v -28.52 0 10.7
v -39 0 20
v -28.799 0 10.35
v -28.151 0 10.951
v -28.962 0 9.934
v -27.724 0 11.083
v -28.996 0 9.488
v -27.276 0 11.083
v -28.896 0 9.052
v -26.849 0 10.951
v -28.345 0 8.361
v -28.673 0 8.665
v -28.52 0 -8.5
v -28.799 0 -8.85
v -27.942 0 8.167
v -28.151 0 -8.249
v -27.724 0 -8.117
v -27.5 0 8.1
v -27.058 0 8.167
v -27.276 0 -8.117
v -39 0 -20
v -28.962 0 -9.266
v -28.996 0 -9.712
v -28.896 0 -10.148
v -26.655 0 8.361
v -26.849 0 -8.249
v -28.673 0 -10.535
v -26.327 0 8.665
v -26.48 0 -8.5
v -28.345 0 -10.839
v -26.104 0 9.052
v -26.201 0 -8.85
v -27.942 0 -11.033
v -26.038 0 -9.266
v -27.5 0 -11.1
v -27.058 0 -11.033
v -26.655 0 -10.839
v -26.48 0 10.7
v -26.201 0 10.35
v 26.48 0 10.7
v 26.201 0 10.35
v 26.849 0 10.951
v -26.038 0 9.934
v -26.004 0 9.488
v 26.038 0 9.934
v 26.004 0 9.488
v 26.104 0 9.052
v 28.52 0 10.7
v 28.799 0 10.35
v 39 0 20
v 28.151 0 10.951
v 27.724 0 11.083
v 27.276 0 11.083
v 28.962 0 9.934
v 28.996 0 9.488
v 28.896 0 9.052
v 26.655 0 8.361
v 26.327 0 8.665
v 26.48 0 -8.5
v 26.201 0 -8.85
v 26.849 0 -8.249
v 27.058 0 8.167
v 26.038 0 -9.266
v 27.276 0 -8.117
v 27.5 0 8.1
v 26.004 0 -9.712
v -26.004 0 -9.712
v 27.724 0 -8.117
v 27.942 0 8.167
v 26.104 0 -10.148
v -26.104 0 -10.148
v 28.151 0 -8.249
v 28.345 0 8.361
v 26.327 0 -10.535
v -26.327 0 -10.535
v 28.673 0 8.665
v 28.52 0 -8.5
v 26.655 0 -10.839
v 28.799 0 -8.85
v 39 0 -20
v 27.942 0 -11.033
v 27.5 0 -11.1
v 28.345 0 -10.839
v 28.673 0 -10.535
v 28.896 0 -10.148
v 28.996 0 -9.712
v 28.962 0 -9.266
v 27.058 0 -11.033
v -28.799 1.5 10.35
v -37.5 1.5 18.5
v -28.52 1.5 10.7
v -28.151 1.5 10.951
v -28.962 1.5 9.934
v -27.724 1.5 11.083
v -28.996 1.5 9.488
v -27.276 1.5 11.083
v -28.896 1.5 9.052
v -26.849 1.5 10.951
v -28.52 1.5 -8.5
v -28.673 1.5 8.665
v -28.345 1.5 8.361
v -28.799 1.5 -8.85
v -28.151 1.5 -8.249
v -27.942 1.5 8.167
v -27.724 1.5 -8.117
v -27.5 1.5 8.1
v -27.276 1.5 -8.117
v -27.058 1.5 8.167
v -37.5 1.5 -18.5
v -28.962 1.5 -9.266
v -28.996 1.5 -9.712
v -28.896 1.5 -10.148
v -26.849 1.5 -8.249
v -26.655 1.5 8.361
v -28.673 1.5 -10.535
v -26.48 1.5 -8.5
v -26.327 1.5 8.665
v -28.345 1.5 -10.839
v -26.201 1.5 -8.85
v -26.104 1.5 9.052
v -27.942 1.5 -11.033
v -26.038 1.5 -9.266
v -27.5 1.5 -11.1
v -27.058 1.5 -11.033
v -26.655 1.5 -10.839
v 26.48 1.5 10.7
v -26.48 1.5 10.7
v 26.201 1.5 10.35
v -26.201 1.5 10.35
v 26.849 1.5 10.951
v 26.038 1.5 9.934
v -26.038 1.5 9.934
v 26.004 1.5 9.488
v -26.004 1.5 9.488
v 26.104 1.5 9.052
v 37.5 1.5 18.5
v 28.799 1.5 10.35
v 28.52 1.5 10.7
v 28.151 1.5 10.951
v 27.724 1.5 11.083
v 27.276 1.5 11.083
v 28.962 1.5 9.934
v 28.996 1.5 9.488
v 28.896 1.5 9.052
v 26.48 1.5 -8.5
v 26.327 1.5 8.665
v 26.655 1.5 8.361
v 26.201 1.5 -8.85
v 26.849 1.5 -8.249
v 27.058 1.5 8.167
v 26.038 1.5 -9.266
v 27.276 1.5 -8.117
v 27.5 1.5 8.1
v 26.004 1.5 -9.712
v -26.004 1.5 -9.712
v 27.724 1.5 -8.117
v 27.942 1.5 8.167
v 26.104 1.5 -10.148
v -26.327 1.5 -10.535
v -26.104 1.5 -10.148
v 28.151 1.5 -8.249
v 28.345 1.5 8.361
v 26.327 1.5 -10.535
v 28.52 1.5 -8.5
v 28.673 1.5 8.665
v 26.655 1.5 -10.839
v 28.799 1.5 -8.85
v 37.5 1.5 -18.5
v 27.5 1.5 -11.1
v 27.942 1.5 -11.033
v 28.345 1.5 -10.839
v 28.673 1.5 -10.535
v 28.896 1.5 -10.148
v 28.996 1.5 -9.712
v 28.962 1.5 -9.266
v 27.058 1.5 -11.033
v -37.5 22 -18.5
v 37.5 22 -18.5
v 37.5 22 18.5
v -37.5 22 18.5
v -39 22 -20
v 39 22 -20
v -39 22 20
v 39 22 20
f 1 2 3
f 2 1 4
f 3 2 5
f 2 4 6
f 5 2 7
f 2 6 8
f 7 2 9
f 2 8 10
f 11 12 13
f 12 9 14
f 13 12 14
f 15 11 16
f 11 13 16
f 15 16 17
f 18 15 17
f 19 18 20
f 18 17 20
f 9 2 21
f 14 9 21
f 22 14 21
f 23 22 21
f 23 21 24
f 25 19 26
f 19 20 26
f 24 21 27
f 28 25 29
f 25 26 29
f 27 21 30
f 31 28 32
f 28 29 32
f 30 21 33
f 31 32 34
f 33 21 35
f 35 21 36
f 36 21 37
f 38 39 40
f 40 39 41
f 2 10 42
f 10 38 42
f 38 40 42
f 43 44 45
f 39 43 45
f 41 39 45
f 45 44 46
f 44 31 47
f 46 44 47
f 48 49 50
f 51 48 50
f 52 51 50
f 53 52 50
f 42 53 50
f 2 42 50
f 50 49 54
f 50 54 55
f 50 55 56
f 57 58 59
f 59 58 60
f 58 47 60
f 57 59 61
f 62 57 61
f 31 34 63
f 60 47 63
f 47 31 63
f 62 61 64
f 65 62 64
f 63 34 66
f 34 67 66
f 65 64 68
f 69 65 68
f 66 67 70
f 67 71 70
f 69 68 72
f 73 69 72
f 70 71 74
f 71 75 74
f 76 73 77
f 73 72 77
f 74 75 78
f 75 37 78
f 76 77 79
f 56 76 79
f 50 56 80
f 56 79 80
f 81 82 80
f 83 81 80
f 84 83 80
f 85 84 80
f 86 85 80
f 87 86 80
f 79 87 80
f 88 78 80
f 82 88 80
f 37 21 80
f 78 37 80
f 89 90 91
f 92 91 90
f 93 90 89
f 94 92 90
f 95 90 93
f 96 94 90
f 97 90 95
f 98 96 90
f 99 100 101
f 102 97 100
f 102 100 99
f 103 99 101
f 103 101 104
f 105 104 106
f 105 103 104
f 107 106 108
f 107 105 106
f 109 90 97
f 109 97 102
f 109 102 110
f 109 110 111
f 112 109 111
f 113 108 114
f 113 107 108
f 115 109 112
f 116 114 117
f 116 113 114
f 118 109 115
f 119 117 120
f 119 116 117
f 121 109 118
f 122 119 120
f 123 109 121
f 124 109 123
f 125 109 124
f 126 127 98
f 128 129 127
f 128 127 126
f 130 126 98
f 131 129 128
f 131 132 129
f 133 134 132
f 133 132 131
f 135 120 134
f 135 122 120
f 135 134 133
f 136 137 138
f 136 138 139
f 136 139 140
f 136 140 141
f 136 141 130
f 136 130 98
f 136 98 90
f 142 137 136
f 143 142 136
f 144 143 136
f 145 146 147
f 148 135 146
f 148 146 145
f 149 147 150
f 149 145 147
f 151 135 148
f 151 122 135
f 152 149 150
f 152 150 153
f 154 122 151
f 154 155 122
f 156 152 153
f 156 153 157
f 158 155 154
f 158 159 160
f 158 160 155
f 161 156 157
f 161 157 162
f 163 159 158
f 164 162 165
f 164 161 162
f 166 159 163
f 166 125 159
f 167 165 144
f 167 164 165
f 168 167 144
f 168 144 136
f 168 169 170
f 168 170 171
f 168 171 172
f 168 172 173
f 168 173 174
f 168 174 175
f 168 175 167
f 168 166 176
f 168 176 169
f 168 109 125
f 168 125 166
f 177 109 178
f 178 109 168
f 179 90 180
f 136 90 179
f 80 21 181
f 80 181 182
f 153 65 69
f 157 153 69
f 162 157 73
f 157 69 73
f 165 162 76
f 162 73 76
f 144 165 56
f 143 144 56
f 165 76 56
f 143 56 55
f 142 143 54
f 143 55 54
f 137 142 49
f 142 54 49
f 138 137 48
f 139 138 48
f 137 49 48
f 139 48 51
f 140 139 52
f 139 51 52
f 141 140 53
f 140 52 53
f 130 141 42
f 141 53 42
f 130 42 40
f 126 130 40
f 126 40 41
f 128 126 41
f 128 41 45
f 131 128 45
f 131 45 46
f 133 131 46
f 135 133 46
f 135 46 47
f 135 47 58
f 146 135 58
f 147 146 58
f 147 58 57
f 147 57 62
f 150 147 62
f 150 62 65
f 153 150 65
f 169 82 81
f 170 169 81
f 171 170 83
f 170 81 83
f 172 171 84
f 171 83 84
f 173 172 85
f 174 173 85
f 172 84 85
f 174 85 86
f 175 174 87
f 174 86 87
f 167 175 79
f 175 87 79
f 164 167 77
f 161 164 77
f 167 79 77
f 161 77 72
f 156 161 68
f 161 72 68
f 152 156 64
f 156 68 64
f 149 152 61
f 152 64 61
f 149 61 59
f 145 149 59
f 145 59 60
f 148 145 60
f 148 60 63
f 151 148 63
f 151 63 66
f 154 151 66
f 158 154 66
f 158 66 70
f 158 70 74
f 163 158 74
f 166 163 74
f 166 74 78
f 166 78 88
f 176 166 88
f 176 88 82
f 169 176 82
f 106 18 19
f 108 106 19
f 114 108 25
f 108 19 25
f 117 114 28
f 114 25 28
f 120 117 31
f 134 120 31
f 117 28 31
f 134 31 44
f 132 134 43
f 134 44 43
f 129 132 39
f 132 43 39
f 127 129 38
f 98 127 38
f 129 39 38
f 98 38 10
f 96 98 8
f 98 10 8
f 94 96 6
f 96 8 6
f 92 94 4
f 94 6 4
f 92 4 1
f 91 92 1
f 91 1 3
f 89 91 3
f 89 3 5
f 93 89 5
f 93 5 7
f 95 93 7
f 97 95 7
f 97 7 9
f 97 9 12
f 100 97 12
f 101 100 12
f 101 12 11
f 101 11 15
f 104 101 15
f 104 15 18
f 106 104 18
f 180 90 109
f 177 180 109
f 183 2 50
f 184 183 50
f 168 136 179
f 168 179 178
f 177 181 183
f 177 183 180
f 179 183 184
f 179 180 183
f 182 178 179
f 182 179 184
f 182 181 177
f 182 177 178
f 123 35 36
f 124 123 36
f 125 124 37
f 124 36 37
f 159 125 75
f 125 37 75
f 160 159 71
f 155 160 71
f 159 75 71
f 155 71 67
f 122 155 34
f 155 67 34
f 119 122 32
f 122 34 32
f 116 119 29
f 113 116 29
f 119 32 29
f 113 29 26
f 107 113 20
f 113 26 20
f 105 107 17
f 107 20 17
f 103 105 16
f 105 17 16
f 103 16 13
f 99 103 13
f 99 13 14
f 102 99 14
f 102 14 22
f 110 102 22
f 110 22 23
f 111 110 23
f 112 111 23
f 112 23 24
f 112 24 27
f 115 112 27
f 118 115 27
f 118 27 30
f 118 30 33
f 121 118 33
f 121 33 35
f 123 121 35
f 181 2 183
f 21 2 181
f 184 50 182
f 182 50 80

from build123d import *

# Parameters (mm, degrees)
SKETCH1_W           = 78
SKETCH1_H           = 40
BOSS_EXTRUDE1_DEPTH = 22
SHELL1_T            = -1.5
SKETCH2_R           = 1.5
CUT_EXTRUDE1_DEPTH  = 50.040799341


with BuildPart() as part:
    # Sketch1 → Boss-Extrude1 (new body)
    with BuildSketch(Plane(origin=(0, 0, 0), x_dir=(1, 0, 0), z_dir=(0, 1, 0))):
        Rectangle(SKETCH1_W, SKETCH1_H)
    extrude(amount=BOSS_EXTRUDE1_DEPTH)

    # Shell1
    shell1_openings = [part.faces().sort_by_distance(p)[0] for p in [
        (0, 22, 0),
    ]]
    offset(amount=SHELL1_T, openings=shell1_openings, kind=Kind.INTERSECTION)

    # Sketch2 → Cut-Extrude1 (cut, through all)
    with BuildSketch(Plane.XZ):
        with Locations(Location((27.5, 9.6, 0), (0, 0, 270))):
            Circle(SKETCH2_R)
        with Locations(Location((27.5, -9.6, 0), (0, 0, 270))):
            Circle(SKETCH2_R)
        with Locations(Location((-27.5, -9.6, 0), (0, 0, 270))):
            Circle(SKETCH2_R)
        with Locations(Location((-27.5, 9.6, 0), (0, 0, 270))):
            Circle(SKETCH2_R)
    extrude(amount=-CUT_EXTRUDE1_DEPTH, mode=Mode.SUBTRACT)


solid = part.part
